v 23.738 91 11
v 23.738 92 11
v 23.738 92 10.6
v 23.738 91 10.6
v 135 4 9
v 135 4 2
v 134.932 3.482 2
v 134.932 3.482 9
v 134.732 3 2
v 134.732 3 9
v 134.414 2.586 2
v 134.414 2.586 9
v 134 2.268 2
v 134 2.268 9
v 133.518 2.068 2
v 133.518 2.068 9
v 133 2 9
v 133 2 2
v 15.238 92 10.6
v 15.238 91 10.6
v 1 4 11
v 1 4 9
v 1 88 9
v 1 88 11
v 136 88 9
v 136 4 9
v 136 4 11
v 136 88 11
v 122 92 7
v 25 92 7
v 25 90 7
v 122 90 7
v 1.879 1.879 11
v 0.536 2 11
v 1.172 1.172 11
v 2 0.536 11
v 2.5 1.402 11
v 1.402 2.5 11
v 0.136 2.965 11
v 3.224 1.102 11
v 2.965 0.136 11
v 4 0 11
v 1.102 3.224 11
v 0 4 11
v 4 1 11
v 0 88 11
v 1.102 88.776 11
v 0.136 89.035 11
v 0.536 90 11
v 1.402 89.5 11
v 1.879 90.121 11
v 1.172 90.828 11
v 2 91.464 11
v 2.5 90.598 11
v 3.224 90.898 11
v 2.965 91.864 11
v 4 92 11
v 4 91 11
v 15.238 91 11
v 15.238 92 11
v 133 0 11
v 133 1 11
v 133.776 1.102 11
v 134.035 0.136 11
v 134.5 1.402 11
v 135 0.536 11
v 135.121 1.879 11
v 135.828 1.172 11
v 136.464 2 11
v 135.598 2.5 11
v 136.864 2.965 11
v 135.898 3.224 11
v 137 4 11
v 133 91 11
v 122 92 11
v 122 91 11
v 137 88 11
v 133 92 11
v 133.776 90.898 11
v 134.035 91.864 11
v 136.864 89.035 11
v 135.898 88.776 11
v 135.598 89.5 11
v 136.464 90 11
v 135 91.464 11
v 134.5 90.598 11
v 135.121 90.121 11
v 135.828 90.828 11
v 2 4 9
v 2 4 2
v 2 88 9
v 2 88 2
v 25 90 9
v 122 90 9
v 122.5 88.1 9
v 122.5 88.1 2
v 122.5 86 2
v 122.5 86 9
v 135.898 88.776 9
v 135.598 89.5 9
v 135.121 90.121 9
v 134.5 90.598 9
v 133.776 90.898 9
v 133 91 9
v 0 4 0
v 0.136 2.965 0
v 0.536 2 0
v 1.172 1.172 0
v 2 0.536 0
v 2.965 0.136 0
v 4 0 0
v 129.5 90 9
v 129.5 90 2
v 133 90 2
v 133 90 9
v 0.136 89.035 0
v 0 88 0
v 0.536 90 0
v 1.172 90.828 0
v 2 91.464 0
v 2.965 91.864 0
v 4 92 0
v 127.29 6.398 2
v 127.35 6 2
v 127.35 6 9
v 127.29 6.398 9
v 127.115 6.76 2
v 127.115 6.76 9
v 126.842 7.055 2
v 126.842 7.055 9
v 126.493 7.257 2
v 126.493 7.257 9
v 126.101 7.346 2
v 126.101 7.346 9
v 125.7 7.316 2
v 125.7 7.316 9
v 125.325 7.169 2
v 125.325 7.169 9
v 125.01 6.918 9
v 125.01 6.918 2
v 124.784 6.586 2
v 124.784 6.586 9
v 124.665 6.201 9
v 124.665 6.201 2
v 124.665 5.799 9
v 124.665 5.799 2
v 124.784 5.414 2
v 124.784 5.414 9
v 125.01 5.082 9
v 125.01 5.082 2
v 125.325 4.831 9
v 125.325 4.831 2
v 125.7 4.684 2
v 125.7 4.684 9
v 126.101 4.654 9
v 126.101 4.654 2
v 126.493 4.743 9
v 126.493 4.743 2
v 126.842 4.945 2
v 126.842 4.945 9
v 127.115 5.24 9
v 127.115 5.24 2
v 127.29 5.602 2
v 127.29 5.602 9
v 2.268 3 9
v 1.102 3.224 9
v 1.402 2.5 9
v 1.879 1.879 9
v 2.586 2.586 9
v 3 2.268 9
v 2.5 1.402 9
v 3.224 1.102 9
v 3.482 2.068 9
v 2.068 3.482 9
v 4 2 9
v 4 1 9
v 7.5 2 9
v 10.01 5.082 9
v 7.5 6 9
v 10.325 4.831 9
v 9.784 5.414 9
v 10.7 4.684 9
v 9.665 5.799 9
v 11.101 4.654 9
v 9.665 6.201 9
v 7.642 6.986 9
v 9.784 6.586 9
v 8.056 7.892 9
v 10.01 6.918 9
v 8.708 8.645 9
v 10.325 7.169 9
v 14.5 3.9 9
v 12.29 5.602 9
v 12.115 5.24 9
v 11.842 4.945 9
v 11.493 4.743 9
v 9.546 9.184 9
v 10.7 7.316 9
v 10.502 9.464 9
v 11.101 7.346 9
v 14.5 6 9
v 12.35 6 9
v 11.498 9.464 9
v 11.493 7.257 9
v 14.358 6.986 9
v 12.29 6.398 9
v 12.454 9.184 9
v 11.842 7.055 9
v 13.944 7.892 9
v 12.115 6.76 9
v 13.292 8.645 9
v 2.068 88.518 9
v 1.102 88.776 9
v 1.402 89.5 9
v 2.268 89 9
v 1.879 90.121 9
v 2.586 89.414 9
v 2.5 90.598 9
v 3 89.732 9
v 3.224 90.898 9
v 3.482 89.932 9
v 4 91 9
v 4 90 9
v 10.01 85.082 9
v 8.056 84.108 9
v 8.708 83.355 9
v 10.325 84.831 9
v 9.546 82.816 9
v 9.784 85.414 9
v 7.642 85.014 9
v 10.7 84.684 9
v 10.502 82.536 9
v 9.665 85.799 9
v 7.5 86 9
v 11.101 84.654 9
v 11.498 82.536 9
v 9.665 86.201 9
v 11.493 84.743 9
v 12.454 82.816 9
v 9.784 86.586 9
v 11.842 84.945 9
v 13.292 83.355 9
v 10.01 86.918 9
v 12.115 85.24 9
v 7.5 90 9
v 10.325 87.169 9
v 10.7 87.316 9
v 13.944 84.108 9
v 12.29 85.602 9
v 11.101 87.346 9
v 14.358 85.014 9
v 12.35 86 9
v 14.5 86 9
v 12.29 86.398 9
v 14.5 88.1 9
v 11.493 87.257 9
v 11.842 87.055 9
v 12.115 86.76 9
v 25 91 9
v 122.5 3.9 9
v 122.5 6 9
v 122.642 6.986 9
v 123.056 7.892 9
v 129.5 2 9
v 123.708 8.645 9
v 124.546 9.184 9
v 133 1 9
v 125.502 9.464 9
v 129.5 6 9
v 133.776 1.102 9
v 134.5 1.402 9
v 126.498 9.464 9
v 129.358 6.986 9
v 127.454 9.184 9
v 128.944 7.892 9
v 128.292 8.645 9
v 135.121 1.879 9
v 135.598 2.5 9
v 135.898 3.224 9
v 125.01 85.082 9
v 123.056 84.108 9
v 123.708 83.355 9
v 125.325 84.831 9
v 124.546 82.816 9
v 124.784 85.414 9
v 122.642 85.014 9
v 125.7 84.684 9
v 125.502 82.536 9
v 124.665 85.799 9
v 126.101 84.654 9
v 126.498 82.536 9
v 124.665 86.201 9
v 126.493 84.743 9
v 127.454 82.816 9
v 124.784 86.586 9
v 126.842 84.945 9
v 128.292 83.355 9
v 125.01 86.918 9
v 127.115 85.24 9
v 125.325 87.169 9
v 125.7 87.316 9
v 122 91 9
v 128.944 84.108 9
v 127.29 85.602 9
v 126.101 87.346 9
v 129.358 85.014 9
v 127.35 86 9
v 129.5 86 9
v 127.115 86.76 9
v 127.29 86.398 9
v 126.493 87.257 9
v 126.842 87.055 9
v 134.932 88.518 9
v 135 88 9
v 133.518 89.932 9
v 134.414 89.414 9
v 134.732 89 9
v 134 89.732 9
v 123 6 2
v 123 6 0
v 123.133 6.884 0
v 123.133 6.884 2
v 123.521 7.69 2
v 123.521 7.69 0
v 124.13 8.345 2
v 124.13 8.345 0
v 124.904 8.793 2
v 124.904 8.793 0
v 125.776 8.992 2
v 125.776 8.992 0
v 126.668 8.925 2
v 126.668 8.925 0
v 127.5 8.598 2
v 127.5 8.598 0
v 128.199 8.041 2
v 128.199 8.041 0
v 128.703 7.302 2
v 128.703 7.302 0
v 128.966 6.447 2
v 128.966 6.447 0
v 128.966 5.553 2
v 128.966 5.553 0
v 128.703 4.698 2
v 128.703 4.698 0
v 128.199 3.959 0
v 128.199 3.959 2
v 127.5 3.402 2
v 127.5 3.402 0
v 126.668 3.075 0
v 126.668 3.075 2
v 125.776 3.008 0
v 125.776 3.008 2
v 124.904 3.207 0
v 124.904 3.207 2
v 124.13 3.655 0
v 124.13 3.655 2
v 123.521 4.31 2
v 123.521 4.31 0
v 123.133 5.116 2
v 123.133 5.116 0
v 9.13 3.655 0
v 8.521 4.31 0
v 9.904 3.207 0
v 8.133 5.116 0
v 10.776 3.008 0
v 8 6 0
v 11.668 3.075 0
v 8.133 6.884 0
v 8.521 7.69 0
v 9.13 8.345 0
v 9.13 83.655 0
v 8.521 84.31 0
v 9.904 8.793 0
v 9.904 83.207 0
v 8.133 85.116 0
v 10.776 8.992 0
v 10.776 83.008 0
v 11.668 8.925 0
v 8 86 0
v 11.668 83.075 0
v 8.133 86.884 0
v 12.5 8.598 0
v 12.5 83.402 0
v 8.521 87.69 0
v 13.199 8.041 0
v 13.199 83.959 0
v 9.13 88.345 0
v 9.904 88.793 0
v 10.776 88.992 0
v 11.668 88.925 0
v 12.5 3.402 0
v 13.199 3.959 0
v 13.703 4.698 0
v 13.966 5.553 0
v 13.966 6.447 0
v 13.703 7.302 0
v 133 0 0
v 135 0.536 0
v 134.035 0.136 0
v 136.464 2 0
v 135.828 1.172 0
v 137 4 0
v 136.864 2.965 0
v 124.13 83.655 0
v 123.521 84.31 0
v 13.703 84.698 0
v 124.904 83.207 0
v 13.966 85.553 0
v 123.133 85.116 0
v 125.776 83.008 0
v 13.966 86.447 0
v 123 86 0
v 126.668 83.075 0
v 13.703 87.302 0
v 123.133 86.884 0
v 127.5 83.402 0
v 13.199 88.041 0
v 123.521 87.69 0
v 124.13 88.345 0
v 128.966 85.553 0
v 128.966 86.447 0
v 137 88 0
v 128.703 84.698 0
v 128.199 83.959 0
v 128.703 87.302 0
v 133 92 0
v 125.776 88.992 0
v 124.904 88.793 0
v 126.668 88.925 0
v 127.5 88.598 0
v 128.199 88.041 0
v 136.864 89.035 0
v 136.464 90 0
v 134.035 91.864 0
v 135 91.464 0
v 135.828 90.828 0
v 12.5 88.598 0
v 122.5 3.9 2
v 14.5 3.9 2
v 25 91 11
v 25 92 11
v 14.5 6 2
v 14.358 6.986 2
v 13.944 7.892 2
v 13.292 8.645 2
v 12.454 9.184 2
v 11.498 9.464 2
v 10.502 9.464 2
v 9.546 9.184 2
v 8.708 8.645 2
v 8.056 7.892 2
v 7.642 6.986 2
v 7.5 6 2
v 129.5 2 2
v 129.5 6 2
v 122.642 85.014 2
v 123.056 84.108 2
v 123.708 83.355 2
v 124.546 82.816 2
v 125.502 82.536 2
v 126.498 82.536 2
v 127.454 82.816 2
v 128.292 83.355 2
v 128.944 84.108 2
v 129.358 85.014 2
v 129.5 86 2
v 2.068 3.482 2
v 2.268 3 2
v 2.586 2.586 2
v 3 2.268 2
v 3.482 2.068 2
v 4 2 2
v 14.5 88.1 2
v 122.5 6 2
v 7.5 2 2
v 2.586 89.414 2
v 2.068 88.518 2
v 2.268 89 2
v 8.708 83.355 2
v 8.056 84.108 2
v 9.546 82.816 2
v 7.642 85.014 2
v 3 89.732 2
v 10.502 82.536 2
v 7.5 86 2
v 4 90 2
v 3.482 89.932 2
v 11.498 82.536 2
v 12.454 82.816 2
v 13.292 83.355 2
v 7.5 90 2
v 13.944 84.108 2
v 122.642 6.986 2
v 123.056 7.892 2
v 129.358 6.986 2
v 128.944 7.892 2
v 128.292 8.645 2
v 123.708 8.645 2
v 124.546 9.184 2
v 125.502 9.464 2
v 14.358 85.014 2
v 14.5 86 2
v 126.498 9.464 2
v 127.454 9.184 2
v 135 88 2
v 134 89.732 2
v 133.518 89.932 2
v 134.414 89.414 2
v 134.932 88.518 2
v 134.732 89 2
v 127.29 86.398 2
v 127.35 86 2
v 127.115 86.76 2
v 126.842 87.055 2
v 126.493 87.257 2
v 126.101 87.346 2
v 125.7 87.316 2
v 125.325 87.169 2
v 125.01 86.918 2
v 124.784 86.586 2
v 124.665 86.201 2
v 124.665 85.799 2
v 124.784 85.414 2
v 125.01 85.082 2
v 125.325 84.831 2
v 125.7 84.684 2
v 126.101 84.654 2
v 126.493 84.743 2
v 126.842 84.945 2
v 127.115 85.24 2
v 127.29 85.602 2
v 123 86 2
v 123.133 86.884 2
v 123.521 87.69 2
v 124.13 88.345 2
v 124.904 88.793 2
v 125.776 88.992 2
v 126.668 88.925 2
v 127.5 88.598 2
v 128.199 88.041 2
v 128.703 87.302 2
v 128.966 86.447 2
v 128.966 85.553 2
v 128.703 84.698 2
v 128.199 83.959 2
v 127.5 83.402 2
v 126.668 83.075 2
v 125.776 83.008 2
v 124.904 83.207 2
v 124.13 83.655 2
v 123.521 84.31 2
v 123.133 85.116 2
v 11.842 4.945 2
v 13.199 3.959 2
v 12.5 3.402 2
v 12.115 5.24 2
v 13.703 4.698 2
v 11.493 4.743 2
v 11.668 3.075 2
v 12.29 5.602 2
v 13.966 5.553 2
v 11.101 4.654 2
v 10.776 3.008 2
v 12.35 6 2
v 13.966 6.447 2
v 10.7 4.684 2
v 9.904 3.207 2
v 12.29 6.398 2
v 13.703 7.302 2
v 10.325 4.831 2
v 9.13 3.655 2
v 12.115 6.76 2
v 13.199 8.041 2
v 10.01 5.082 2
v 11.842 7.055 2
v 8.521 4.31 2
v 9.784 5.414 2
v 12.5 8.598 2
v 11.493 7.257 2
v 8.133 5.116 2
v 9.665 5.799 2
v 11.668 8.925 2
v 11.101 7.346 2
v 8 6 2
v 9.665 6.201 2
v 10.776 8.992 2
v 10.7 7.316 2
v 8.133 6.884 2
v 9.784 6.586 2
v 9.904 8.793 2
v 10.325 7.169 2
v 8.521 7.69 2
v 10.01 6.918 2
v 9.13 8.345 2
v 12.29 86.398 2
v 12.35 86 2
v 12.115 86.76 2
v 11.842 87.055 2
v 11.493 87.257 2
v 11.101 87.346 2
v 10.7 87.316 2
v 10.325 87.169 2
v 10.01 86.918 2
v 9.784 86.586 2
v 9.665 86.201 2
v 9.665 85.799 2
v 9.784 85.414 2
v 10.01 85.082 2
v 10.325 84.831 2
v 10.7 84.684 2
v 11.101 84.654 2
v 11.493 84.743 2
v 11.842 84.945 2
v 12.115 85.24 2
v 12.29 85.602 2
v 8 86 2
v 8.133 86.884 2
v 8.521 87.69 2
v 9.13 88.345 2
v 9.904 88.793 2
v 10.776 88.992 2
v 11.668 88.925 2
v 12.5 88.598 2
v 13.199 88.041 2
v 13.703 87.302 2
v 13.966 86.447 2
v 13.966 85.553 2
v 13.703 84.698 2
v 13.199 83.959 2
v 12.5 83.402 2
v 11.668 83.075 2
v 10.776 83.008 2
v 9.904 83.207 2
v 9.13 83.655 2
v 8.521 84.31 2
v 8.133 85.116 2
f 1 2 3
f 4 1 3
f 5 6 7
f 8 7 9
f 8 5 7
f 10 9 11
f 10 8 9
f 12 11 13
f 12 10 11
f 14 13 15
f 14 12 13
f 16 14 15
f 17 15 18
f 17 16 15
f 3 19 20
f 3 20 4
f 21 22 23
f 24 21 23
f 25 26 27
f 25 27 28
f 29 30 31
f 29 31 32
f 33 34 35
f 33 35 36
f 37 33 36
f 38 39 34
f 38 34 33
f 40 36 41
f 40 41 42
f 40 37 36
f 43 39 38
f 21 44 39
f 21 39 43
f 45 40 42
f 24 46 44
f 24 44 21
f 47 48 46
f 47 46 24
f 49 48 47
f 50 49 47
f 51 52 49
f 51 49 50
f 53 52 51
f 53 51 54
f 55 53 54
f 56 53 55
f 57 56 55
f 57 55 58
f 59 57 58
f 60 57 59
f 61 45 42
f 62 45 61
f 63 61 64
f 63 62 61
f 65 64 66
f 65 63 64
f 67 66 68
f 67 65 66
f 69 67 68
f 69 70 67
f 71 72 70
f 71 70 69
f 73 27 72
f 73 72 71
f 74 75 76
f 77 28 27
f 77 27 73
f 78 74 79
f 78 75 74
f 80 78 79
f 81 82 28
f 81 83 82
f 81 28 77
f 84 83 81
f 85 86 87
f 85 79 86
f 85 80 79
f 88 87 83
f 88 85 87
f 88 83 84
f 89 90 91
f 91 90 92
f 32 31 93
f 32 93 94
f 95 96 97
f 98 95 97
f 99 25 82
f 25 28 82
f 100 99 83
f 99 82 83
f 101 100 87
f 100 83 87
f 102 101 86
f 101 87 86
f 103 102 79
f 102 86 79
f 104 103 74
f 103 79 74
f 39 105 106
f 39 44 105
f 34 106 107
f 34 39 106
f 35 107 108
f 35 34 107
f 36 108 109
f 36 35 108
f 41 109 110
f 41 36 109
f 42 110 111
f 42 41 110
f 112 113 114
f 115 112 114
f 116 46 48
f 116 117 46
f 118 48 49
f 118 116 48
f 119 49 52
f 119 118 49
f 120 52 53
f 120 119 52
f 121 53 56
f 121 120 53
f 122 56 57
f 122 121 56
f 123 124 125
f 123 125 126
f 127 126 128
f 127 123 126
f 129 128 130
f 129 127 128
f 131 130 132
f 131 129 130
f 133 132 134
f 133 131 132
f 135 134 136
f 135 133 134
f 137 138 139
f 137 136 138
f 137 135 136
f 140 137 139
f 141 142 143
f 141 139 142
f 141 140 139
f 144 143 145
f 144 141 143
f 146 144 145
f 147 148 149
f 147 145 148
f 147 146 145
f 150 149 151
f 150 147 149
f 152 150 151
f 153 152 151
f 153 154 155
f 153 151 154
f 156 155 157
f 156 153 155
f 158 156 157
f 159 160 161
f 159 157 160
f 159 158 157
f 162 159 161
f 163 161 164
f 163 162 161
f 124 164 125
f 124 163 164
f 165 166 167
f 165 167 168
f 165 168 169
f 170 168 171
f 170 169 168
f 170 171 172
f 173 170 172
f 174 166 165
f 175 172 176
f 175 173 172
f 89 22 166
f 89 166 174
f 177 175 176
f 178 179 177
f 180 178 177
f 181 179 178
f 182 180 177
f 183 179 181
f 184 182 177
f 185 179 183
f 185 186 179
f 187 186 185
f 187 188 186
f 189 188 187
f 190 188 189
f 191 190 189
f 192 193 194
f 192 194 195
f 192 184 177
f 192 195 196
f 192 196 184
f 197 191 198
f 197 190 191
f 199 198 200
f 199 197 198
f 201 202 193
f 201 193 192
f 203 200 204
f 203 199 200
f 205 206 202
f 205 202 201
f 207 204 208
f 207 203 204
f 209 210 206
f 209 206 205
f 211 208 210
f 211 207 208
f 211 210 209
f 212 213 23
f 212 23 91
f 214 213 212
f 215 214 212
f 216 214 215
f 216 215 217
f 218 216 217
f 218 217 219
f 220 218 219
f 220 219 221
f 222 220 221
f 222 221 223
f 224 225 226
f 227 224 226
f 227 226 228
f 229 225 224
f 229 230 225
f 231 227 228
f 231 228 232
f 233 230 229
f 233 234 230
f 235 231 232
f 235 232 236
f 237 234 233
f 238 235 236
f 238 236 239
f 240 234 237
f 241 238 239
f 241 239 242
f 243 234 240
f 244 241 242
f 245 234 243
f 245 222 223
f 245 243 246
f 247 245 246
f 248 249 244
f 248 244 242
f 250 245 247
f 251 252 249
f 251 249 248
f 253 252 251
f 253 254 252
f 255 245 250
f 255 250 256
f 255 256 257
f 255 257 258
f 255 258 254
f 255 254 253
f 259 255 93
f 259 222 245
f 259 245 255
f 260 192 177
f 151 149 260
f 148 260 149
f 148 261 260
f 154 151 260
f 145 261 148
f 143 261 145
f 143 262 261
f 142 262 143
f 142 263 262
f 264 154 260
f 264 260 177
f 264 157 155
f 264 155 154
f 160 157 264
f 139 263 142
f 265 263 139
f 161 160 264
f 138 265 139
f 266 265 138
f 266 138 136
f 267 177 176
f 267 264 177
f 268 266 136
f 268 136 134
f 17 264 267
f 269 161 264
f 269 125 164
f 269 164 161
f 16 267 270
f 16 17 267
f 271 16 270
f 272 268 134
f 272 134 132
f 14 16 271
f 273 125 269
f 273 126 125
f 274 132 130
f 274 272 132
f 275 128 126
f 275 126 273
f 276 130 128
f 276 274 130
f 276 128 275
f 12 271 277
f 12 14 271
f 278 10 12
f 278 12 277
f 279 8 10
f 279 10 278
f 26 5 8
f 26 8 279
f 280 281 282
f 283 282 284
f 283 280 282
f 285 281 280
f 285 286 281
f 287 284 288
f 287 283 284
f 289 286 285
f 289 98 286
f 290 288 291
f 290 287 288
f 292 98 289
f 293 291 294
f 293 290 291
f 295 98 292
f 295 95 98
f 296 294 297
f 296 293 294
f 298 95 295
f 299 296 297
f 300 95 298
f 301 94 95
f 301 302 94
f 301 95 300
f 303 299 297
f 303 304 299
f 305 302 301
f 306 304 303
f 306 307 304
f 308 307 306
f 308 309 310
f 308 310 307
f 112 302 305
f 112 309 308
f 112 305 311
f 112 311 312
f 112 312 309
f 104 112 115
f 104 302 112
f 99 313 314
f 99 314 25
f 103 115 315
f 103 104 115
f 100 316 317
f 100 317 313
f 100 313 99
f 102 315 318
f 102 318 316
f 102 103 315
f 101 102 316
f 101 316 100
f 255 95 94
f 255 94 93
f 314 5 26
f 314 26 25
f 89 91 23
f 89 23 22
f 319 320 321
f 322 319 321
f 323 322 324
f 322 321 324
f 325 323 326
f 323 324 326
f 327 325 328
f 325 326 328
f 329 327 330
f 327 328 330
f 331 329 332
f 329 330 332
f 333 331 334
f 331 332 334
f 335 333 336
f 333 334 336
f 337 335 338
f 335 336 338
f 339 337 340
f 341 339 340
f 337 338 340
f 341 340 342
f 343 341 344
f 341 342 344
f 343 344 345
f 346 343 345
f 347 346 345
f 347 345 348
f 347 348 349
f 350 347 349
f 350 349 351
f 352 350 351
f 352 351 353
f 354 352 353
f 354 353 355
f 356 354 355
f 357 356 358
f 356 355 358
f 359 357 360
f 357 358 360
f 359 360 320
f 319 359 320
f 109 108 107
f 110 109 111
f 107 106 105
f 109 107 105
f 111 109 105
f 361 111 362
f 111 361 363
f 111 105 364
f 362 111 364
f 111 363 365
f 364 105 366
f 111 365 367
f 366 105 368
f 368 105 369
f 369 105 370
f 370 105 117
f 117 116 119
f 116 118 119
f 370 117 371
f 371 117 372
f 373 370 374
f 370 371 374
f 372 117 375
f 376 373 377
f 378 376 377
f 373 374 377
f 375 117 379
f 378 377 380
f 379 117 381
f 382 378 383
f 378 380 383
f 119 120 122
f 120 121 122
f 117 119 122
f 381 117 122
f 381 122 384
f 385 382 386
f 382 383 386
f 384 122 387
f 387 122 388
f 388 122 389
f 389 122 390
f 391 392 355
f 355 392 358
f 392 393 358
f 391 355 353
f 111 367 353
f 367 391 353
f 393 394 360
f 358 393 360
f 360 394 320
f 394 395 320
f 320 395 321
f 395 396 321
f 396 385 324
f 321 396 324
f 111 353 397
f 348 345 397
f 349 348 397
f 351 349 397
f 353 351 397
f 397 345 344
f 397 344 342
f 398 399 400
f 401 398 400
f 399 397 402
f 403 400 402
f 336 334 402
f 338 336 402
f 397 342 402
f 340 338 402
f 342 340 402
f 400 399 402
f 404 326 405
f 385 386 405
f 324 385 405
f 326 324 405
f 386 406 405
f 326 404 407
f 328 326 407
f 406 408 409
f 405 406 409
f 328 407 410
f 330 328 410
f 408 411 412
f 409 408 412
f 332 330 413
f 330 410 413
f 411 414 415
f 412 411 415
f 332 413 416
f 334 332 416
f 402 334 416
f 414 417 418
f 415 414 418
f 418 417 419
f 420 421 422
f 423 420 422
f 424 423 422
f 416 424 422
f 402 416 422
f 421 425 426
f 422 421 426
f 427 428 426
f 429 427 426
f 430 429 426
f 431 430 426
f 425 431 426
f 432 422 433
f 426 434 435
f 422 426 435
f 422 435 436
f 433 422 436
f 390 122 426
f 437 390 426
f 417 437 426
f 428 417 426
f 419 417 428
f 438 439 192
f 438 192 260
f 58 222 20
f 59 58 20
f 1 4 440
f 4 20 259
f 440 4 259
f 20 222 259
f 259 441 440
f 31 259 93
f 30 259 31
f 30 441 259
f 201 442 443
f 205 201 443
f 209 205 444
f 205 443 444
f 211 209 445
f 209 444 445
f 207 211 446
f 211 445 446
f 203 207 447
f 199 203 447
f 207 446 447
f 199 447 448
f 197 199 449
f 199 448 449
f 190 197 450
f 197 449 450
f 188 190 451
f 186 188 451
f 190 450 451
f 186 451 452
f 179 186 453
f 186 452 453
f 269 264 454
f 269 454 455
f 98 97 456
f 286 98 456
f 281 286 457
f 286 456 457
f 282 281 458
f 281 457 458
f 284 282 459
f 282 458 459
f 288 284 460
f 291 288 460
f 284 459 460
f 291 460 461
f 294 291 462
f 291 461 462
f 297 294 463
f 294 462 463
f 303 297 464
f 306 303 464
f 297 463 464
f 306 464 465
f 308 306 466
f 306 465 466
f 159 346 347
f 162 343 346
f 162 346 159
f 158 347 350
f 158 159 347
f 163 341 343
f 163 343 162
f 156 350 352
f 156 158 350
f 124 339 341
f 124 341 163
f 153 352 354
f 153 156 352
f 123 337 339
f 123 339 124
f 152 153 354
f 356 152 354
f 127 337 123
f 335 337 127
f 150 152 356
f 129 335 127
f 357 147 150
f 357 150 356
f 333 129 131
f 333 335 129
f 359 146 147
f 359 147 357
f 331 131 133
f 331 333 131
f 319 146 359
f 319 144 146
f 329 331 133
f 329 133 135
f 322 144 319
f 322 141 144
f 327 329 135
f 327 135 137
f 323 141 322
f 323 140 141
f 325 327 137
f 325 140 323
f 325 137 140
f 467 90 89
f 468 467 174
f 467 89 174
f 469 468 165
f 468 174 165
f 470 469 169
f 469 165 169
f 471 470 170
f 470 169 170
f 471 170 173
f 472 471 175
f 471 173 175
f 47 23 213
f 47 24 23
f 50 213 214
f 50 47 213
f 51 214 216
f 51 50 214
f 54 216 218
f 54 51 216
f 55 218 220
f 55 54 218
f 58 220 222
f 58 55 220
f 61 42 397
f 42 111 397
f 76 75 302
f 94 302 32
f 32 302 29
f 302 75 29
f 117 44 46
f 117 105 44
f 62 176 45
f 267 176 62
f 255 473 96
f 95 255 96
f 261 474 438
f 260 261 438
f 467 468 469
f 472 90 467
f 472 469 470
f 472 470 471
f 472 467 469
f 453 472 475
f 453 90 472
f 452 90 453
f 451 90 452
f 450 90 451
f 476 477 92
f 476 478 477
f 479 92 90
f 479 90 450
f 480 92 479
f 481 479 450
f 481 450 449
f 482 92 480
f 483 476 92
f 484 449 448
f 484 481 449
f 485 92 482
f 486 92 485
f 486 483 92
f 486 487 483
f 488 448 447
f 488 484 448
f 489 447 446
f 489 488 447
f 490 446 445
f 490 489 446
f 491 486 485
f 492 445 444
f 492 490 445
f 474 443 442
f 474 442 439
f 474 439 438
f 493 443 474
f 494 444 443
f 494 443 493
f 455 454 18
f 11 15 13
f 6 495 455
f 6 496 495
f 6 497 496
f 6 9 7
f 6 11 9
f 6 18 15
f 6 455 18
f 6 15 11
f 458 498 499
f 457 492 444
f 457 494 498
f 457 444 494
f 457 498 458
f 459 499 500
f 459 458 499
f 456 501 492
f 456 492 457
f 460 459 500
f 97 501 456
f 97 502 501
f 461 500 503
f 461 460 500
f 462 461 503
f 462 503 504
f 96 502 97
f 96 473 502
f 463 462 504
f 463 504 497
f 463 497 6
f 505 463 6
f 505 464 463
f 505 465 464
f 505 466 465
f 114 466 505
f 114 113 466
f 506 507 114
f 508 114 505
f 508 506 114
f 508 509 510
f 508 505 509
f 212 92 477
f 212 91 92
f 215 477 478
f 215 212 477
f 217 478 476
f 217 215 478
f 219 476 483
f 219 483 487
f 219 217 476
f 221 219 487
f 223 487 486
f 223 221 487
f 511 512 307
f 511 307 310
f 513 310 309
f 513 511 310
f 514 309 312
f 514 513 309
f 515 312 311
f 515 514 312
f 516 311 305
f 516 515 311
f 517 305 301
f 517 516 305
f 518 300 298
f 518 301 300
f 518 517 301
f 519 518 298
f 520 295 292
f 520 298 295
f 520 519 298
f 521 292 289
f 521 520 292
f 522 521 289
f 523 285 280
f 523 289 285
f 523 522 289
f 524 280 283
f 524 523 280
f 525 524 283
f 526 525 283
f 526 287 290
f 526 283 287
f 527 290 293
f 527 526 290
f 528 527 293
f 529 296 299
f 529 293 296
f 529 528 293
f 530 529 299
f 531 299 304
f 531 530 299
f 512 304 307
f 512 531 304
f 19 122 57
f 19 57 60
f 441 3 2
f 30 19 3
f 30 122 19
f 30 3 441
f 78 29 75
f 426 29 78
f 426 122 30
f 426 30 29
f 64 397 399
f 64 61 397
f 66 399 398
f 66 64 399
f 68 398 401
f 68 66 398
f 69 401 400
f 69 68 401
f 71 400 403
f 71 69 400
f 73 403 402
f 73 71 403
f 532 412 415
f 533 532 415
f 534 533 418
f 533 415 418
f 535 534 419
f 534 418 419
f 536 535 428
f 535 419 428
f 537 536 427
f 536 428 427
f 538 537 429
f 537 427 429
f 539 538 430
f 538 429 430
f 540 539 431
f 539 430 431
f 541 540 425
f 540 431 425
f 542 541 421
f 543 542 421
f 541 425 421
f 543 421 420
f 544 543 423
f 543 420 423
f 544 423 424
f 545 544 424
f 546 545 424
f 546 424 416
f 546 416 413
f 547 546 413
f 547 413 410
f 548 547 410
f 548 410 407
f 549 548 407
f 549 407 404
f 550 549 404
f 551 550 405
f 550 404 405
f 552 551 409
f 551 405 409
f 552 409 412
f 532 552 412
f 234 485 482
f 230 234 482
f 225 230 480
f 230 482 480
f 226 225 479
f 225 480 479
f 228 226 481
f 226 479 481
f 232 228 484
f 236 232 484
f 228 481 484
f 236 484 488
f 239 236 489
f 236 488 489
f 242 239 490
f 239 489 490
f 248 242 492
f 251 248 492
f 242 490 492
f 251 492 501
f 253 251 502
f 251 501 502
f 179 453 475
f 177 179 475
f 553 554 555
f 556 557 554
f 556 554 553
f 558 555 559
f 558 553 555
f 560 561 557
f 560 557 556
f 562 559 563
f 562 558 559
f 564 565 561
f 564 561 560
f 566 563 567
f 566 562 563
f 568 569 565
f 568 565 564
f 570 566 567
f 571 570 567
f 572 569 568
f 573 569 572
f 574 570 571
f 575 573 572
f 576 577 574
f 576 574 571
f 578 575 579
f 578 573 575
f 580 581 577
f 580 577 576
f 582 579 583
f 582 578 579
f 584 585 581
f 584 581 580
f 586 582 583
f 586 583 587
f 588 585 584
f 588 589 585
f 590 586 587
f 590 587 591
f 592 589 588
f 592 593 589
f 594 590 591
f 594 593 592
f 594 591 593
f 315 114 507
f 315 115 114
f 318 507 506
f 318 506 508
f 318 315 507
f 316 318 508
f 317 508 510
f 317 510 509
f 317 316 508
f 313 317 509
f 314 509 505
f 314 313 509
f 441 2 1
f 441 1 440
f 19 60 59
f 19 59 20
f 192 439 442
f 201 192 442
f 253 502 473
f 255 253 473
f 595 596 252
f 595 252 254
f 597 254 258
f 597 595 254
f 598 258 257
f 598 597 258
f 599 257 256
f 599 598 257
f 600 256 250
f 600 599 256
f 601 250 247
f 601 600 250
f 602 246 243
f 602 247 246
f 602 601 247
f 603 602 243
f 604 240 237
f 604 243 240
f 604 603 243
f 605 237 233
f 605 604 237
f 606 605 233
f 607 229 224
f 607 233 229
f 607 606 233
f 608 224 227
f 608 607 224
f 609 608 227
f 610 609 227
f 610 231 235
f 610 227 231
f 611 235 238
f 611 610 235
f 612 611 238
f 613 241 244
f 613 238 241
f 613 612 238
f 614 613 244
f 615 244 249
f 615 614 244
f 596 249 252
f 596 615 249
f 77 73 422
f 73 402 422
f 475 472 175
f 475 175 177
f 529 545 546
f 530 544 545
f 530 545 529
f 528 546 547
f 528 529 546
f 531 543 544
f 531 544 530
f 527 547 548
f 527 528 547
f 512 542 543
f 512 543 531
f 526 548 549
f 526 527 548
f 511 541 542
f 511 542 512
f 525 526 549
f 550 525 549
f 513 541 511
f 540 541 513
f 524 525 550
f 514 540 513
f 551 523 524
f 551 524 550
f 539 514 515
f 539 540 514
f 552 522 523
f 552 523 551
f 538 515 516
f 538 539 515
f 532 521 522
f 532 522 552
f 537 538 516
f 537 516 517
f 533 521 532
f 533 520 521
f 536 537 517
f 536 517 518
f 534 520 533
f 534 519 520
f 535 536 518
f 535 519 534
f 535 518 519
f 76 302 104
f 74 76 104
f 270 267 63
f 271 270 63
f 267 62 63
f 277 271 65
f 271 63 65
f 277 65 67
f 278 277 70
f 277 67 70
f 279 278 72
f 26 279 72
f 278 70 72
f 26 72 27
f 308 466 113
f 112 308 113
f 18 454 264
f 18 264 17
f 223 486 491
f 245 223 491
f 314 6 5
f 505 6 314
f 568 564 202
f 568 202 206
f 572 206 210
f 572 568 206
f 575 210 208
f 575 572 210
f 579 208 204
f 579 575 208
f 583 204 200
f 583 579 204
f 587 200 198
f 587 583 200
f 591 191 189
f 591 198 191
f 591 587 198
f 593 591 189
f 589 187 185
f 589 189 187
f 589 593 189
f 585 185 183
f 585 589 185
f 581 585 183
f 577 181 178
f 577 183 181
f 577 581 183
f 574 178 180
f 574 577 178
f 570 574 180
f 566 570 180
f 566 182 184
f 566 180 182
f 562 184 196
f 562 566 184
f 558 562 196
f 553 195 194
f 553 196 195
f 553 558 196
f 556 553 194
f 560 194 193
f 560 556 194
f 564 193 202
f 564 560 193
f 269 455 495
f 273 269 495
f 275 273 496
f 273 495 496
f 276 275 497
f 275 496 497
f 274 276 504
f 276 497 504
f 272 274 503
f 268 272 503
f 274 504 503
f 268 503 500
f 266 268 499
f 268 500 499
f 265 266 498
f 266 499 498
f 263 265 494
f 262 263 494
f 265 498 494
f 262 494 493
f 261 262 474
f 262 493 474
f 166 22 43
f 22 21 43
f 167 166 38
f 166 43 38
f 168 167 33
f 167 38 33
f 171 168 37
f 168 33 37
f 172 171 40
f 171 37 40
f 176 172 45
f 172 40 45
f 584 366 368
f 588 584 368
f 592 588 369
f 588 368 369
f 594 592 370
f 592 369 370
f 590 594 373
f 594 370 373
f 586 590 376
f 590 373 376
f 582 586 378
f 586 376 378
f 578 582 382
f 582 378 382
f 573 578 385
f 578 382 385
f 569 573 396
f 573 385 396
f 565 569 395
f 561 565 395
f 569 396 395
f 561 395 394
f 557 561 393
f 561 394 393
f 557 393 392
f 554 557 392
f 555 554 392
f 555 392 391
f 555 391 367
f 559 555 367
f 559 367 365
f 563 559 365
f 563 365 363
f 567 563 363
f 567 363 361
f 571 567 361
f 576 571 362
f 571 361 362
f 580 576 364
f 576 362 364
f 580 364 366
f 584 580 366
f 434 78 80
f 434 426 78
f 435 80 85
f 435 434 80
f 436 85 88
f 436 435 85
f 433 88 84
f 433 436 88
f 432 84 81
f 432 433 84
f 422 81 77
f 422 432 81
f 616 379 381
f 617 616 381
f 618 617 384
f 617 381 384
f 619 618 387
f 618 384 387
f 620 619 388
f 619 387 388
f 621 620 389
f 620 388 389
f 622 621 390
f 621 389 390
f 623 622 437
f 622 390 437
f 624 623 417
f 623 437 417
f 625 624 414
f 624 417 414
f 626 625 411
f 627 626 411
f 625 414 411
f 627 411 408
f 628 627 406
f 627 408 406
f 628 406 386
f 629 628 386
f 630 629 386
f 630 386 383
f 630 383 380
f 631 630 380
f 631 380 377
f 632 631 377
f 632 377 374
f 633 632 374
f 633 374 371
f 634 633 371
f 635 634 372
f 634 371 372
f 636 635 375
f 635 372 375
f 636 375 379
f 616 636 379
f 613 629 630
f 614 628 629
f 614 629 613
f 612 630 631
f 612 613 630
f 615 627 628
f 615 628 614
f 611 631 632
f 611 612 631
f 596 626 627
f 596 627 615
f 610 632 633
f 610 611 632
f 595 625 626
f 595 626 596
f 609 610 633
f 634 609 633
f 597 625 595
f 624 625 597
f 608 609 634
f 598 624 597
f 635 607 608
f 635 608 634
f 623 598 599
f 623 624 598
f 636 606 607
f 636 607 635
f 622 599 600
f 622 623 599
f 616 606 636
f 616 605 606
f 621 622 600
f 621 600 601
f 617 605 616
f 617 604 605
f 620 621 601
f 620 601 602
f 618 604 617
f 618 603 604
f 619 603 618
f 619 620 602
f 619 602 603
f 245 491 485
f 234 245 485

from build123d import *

# Parameters (mm, degrees)
SKETCH1_W           = 137
SKETCH1_H           = 92
BOSS_EXTRUDE1_DEPTH = 2
SKETCH2_W           = 137
SKETCH2_H           = 92
SKETCH2_W_2         = 133
SKETCH2_H_2         = 88
BOSS_EXTRUDE2_DEPTH = 7
SKETCH3_W           = 137
SKETCH3_H           = 92
SKETCH3_W_2         = 135
SKETCH3_H_2         = 90
BOSS_EXTRUDE3_DEPTH = 2
SKETCH4_R           = 1.35
BOSS_EXTRUDE4_DEPTH = 7
SKETCH8_W           = 108
SKETCH8_H           = 1.9
BOSS_EXTRUDE6_DEPTH = 7
FILLET1_R           = 2
FILLET2_R           = 3
FILLET3_R           = 4
SKETCH11_W          = 108
SKETCH11_H          = 1.9
BOSS_EXTRUDE7_DEPTH = 7
SKETCH12_W          = 97
SKETCH12_H          = 4
CUT_EXTRUDE3_DEPTH  = 2
CUT_EXTRUDE4_START  = -10
SKETCH13_R          = 1.35
CUT_EXTRUDE4_DEPTH  = 10
SKETCH14_W          = 8.5
SKETCH14_H          = 0.4
CUT_EXTRUDE5_DEPTH  = 2
SKETCH16_R          = 3
CUT_EXTRUDE12_DEPTH = 2


with BuildPart() as part:
    # Sketch1 → Boss-Extrude1 (new body)
    with BuildSketch(Plane.XY):
        with Locations((68.5, 46)):
            Rectangle(SKETCH1_W, SKETCH1_H)
    extrude(amount=BOSS_EXTRUDE1_DEPTH)

    # Sketch2 → Boss-Extrude2 (add)
    with BuildSketch(Plane.XY.offset(2)):
        with Locations((68.5, 46)):
            Rectangle(SKETCH2_W, SKETCH2_H)
        with Locations((68.5, 46)):
            Rectangle(SKETCH2_W_2, SKETCH2_H_2, mode=Mode.SUBTRACT)
    extrude(amount=BOSS_EXTRUDE2_DEPTH)

    # Sketch3 → Boss-Extrude3 (add)
    with BuildSketch(Plane.XY.offset(9)):
        with Locations((68.5, 46)):
            Rectangle(SKETCH3_W, SKETCH3_H)
        with Locations((68.5, 46)):
            Rectangle(SKETCH3_W_2, SKETCH3_H_2, mode=Mode.SUBTRACT)
    extrude(amount=BOSS_EXTRUDE3_DEPTH)

    # Sketch4 → Boss-Extrude4 (add)
    # profile 1 of 4: a face of its own
    with BuildSketch(Plane.XY.offset(2)):
        with BuildLine():
            Line((7.5, 6), (7.5, 2))
            Line((7.5, 2), (14.5, 2))
            Line((14.5, 2), (14.5, 6))
            ThreePointArc((14.5, 6), (11, 9.5), (7.5, 6))
        make_face()
        with Locations((11, 6)):
            Circle(SKETCH4_R, mode=Mode.SUBTRACT)
    # profile 2 of 4: a face of its own
    with BuildSketch(Plane.XY.offset(2)):
        with BuildLine():
            Line((122.5, 6), (122.5, 2))
            Line((122.5, 2), (129.5, 2))
            Line((129.5, 2), (129.5, 6))
            ThreePointArc((129.5, 6), (126, 9.5), (122.5, 6))
        make_face()
        with Locations((126, 6)):
            Circle(SKETCH4_R, mode=Mode.SUBTRACT)
    # profile 3 of 4: a face of its own
    with BuildSketch(Plane.XY.offset(2)):
        with BuildLine():
            Line((129.5, 86), (129.5, 90))
            Line((129.5, 90), (122.5, 90))
            Line((122.5, 90), (122.5, 86))
            ThreePointArc((122.5, 86), (126, 82.5), (129.5, 86))
        make_face()
        with Locations((126, 86)):
            Circle(SKETCH4_R, mode=Mode.SUBTRACT)
    # profile 4 of 4: a face of its own
    with BuildSketch(Plane.XY.offset(2)):
        with BuildLine():
            Line((14.5, 86), (14.5, 90))
            Line((14.5, 90), (7.5, 90))
            Line((7.5, 90), (7.5, 86))
            ThreePointArc((7.5, 86), (11, 82.5), (14.5, 86))
        make_face()
        with Locations((11, 86)):
            Circle(SKETCH4_R, mode=Mode.SUBTRACT)
    extrude(amount=BOSS_EXTRUDE4_DEPTH)

    # Sketch8 → Boss-Extrude6 (add)
    with BuildSketch(Plane.XY.offset(2)):
        with Locations((68.5, 2.95)):
            Rectangle(SKETCH8_W, SKETCH8_H)
    extrude(amount=BOSS_EXTRUDE6_DEPTH)

    # Fillet1
    fillet1_edges = [part.edges().sort_by_distance(p)[0] for p in [
        (2, 2, 5.5),
        (135, 2, 5.5),
        (135, 90, 5.5),
        (2, 90, 5.5),
    ]]
    fillet(fillet1_edges, radius=FILLET1_R)

    # Fillet2
    fillet2_edges = [part.edges().sort_by_distance(p)[0] for p in [
        (1, 1, 10),
        (136, 1, 10),
        (136, 91, 10),
        (1, 91, 10),
    ]]
    fillet(fillet2_edges, radius=FILLET2_R)

    # Fillet3
    fillet3_edges = [part.edges().sort_by_distance(p)[0] for p in [
        (0, 92, 5.5),
        (137, 92, 5.5),
        (137, 0, 5.5),
        (0, 0, 5.5),
    ]]
    fillet(fillet3_edges, radius=FILLET3_R)

    # Sketch11 → Boss-Extrude7 (add)
    with BuildSketch(Plane.XY.offset(2)):
        with Locations((68.5, 89.05)):
            Rectangle(SKETCH11_W, SKETCH11_H)
    extrude(amount=BOSS_EXTRUDE7_DEPTH)

    # Sketch12 → Cut-Extrude3 (cut)
    with BuildSketch(Plane(origin=(0, 92, 0), x_dir=(1, 0, 0), z_dir=(0, 1, 0))):
        with Locations((73.5, -9)):
            Rectangle(SKETCH12_W, SKETCH12_H)
    extrude(amount=-CUT_EXTRUDE3_DEPTH, mode=Mode.SUBTRACT)

    # Sketch13 → Cut-Extrude4 (cut)
    with BuildSketch(Plane.XY.offset(9).offset(CUT_EXTRUDE4_START)):
        with Locations(Location((11, 86, 0), (0, 0, 180))):
            Circle(SKETCH13_R)
        with Locations(Location((11, 6, 0), (0, 0, 180))):
            Circle(SKETCH13_R)
        with Locations(Location((126, 6, 0), (0, 0, 180))):
            Circle(SKETCH13_R)
        with Locations(Location((126, 86, 0), (0, 0, 180))):
            Circle(SKETCH13_R)
    extrude(amount=CUT_EXTRUDE4_DEPTH, mode=Mode.SUBTRACT)

    # Sketch14 → Cut-Extrude5 (cut)
    with BuildSketch(Plane(origin=(0, 92, 0), x_dir=(1, 0, 0), z_dir=(0, 1, 0))):
        with Locations((19.488221945, -10.8)):
            Rectangle(SKETCH14_W, SKETCH14_H)
    extrude(amount=-CUT_EXTRUDE5_DEPTH, mode=Mode.SUBTRACT)

    # Sketch16 → Cut-Extrude12 (cut)
    with BuildSketch(Plane(origin=(0, 0, 0), x_dir=(-1, 0, 0), z_dir=(0, 0, -1))):
        with Locations((-126, 86)):
            Circle(SKETCH16_R)
        with Locations((-11, 86)):
            Circle(SKETCH16_R)
        with Locations((-11, 6)):
            Circle(SKETCH16_R)
        with Locations((-126, 6)):
            Circle(SKETCH16_R)
    extrude(amount=-CUT_EXTRUDE12_DEPTH, mode=Mode.SUBTRACT)


solid = part.part
